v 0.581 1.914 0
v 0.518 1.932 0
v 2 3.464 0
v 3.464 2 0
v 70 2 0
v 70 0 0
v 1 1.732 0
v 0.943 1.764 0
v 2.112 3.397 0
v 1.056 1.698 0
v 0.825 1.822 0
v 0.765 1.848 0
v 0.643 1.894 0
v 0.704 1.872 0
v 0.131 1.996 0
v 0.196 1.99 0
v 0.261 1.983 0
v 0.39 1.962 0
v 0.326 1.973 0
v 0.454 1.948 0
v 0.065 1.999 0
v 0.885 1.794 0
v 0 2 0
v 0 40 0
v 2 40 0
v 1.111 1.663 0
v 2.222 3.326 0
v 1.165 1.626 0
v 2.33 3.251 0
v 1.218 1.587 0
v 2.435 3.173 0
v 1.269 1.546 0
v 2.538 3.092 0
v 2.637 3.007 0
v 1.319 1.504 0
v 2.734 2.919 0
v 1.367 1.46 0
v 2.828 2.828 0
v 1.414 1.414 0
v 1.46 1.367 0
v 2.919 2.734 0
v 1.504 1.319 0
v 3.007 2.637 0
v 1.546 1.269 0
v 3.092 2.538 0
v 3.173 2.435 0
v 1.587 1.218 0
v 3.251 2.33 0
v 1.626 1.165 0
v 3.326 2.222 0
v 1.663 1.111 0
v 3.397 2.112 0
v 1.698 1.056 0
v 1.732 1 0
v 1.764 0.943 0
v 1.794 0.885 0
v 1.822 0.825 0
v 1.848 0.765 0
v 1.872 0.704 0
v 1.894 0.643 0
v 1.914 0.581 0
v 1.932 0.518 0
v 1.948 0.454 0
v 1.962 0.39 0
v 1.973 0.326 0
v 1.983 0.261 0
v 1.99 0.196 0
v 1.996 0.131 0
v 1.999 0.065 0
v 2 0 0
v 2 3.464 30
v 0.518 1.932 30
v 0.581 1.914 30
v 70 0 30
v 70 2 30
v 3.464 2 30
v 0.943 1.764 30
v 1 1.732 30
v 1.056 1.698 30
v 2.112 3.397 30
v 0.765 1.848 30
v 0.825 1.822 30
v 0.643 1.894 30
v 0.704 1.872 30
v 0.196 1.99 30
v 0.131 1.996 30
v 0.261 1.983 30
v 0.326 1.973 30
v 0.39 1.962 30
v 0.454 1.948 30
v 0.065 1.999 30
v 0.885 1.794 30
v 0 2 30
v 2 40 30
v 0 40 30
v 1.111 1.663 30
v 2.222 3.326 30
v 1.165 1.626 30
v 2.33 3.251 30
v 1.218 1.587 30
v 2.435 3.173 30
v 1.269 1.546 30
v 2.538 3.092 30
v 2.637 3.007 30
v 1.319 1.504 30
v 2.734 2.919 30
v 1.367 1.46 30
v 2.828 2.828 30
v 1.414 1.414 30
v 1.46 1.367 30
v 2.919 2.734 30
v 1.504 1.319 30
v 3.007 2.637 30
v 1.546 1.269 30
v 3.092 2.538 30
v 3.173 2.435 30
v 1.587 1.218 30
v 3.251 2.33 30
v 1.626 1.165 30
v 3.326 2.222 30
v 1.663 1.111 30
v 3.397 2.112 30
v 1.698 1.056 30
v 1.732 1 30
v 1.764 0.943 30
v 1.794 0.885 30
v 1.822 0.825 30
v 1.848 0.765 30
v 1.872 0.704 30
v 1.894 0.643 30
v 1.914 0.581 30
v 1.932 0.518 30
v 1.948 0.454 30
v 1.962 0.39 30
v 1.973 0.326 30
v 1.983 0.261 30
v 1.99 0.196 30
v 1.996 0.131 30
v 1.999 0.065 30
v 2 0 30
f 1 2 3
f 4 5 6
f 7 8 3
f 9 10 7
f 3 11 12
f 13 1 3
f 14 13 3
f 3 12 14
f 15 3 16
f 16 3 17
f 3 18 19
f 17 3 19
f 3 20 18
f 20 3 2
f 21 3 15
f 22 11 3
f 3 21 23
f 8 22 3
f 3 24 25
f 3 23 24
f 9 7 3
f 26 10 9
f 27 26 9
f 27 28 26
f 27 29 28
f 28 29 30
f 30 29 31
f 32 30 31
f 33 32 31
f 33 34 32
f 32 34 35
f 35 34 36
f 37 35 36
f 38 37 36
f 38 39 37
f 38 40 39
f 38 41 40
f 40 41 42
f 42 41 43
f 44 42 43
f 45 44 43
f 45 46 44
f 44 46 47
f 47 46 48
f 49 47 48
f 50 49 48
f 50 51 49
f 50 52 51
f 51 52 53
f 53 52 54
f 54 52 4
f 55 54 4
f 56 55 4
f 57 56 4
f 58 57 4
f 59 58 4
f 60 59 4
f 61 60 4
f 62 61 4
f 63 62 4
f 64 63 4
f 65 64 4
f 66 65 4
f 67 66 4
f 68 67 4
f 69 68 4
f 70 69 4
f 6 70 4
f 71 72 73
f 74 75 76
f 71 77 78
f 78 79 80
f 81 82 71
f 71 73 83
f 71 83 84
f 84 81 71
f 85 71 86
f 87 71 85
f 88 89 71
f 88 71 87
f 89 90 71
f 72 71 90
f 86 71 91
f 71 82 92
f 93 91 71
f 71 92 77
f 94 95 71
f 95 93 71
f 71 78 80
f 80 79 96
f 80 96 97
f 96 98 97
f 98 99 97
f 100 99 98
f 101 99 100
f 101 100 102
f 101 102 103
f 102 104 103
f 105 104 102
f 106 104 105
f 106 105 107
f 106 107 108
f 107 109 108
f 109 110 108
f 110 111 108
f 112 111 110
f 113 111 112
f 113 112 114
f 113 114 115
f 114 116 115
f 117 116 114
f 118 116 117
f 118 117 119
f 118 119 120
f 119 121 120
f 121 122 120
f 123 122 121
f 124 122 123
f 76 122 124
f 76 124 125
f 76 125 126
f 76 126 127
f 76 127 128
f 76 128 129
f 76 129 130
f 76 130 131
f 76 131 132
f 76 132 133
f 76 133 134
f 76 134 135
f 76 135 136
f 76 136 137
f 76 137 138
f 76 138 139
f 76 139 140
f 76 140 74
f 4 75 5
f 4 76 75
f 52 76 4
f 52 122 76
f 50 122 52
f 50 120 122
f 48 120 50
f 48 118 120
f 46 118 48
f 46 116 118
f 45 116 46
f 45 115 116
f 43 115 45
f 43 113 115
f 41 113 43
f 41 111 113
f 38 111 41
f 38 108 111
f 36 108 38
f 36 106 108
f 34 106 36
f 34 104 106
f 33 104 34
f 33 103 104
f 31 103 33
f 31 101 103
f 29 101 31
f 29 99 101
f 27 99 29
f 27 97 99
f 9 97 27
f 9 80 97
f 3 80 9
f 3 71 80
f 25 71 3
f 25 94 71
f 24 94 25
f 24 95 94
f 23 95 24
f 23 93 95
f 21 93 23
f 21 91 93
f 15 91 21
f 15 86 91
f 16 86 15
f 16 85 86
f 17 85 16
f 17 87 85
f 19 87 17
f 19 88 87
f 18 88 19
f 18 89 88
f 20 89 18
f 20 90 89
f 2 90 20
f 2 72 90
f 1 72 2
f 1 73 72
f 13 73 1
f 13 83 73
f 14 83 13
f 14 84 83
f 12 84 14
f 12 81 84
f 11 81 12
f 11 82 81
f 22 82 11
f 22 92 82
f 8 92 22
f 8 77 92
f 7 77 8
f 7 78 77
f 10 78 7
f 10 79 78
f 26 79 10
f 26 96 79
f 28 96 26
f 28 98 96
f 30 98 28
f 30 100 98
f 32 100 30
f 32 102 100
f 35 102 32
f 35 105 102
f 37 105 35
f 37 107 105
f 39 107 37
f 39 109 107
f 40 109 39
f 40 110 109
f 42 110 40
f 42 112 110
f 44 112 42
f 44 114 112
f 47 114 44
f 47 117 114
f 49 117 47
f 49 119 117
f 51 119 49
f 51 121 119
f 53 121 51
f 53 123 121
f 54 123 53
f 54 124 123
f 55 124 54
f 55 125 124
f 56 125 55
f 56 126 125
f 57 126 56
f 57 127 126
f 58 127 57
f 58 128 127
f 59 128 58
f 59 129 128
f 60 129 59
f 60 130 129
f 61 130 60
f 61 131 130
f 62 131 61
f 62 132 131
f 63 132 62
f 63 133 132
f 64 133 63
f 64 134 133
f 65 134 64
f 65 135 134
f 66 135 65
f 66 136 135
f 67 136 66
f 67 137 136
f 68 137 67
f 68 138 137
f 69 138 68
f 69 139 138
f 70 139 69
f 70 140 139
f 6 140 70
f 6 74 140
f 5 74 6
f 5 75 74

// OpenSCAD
// L-bracket (single 90° sheet-metal bend), mm
thickness_mm = 2.0;
outside_length_a_mm = 70.0;   // flange A
outside_length_b_mm = 40.0;   // flange B
bracket_width_mm = 30.0;
bend_radius_mm = 2.0;

// Bend allowance-based developed length (K-factor 0.45)
k_factor = 0.45;
bend_angle_deg = 90.0;
bend_allowance_mm = (bend_angle_deg * PI / 180.0) * (bend_radius_mm + k_factor * thickness_mm);

// Flat-length estimate from outside leg dimensions with bend allowance
flat_length_mm = outside_length_a_mm + outside_length_b_mm - 2.0 * thickness_mm + bend_allowance_mm;

echo(str(
    "MAKERBENCH-SHEETMETAL: ",
    "{\"thickness_mm\": ", thickness_mm,
    ", \"bend_radius_mm\": ", bend_radius_mm,
    ", \"flat_length_mm\": ", flat_length_mm,
    "}"
));

module bend_fillet(inner_r, t, fn=192) {
    // Constant-thickness annular quarter (inner radius = inner_r, outer = inner_r + t)
    intersection() {
        difference() {
            circle(r = inner_r + t, $fn = fn);
            circle(r = inner_r, $fn = fn);
        }
        square([inner_r + t, inner_r + t], center = false);
    }
}

module l_bracket_profile() {
    // Flat cross-section in X-Y plane, then extruded through width
    difference() {
        union() {
            // Long flange
            square([outside_length_a_mm, thickness_mm], center = false);

            // Short flange
            square([thickness_mm, outside_length_b_mm], center = false);

            // Inside-radius bend transition
            bend_fillet(bend_radius_mm, thickness_mm);
        }

        // Hollow inside radius of the bend
        circle(r = bend_radius_mm, $fn = 192);
    }
}

linear_extrude(height = bracket_width_mm, convexity = 10)
    l_bracket_profile();
